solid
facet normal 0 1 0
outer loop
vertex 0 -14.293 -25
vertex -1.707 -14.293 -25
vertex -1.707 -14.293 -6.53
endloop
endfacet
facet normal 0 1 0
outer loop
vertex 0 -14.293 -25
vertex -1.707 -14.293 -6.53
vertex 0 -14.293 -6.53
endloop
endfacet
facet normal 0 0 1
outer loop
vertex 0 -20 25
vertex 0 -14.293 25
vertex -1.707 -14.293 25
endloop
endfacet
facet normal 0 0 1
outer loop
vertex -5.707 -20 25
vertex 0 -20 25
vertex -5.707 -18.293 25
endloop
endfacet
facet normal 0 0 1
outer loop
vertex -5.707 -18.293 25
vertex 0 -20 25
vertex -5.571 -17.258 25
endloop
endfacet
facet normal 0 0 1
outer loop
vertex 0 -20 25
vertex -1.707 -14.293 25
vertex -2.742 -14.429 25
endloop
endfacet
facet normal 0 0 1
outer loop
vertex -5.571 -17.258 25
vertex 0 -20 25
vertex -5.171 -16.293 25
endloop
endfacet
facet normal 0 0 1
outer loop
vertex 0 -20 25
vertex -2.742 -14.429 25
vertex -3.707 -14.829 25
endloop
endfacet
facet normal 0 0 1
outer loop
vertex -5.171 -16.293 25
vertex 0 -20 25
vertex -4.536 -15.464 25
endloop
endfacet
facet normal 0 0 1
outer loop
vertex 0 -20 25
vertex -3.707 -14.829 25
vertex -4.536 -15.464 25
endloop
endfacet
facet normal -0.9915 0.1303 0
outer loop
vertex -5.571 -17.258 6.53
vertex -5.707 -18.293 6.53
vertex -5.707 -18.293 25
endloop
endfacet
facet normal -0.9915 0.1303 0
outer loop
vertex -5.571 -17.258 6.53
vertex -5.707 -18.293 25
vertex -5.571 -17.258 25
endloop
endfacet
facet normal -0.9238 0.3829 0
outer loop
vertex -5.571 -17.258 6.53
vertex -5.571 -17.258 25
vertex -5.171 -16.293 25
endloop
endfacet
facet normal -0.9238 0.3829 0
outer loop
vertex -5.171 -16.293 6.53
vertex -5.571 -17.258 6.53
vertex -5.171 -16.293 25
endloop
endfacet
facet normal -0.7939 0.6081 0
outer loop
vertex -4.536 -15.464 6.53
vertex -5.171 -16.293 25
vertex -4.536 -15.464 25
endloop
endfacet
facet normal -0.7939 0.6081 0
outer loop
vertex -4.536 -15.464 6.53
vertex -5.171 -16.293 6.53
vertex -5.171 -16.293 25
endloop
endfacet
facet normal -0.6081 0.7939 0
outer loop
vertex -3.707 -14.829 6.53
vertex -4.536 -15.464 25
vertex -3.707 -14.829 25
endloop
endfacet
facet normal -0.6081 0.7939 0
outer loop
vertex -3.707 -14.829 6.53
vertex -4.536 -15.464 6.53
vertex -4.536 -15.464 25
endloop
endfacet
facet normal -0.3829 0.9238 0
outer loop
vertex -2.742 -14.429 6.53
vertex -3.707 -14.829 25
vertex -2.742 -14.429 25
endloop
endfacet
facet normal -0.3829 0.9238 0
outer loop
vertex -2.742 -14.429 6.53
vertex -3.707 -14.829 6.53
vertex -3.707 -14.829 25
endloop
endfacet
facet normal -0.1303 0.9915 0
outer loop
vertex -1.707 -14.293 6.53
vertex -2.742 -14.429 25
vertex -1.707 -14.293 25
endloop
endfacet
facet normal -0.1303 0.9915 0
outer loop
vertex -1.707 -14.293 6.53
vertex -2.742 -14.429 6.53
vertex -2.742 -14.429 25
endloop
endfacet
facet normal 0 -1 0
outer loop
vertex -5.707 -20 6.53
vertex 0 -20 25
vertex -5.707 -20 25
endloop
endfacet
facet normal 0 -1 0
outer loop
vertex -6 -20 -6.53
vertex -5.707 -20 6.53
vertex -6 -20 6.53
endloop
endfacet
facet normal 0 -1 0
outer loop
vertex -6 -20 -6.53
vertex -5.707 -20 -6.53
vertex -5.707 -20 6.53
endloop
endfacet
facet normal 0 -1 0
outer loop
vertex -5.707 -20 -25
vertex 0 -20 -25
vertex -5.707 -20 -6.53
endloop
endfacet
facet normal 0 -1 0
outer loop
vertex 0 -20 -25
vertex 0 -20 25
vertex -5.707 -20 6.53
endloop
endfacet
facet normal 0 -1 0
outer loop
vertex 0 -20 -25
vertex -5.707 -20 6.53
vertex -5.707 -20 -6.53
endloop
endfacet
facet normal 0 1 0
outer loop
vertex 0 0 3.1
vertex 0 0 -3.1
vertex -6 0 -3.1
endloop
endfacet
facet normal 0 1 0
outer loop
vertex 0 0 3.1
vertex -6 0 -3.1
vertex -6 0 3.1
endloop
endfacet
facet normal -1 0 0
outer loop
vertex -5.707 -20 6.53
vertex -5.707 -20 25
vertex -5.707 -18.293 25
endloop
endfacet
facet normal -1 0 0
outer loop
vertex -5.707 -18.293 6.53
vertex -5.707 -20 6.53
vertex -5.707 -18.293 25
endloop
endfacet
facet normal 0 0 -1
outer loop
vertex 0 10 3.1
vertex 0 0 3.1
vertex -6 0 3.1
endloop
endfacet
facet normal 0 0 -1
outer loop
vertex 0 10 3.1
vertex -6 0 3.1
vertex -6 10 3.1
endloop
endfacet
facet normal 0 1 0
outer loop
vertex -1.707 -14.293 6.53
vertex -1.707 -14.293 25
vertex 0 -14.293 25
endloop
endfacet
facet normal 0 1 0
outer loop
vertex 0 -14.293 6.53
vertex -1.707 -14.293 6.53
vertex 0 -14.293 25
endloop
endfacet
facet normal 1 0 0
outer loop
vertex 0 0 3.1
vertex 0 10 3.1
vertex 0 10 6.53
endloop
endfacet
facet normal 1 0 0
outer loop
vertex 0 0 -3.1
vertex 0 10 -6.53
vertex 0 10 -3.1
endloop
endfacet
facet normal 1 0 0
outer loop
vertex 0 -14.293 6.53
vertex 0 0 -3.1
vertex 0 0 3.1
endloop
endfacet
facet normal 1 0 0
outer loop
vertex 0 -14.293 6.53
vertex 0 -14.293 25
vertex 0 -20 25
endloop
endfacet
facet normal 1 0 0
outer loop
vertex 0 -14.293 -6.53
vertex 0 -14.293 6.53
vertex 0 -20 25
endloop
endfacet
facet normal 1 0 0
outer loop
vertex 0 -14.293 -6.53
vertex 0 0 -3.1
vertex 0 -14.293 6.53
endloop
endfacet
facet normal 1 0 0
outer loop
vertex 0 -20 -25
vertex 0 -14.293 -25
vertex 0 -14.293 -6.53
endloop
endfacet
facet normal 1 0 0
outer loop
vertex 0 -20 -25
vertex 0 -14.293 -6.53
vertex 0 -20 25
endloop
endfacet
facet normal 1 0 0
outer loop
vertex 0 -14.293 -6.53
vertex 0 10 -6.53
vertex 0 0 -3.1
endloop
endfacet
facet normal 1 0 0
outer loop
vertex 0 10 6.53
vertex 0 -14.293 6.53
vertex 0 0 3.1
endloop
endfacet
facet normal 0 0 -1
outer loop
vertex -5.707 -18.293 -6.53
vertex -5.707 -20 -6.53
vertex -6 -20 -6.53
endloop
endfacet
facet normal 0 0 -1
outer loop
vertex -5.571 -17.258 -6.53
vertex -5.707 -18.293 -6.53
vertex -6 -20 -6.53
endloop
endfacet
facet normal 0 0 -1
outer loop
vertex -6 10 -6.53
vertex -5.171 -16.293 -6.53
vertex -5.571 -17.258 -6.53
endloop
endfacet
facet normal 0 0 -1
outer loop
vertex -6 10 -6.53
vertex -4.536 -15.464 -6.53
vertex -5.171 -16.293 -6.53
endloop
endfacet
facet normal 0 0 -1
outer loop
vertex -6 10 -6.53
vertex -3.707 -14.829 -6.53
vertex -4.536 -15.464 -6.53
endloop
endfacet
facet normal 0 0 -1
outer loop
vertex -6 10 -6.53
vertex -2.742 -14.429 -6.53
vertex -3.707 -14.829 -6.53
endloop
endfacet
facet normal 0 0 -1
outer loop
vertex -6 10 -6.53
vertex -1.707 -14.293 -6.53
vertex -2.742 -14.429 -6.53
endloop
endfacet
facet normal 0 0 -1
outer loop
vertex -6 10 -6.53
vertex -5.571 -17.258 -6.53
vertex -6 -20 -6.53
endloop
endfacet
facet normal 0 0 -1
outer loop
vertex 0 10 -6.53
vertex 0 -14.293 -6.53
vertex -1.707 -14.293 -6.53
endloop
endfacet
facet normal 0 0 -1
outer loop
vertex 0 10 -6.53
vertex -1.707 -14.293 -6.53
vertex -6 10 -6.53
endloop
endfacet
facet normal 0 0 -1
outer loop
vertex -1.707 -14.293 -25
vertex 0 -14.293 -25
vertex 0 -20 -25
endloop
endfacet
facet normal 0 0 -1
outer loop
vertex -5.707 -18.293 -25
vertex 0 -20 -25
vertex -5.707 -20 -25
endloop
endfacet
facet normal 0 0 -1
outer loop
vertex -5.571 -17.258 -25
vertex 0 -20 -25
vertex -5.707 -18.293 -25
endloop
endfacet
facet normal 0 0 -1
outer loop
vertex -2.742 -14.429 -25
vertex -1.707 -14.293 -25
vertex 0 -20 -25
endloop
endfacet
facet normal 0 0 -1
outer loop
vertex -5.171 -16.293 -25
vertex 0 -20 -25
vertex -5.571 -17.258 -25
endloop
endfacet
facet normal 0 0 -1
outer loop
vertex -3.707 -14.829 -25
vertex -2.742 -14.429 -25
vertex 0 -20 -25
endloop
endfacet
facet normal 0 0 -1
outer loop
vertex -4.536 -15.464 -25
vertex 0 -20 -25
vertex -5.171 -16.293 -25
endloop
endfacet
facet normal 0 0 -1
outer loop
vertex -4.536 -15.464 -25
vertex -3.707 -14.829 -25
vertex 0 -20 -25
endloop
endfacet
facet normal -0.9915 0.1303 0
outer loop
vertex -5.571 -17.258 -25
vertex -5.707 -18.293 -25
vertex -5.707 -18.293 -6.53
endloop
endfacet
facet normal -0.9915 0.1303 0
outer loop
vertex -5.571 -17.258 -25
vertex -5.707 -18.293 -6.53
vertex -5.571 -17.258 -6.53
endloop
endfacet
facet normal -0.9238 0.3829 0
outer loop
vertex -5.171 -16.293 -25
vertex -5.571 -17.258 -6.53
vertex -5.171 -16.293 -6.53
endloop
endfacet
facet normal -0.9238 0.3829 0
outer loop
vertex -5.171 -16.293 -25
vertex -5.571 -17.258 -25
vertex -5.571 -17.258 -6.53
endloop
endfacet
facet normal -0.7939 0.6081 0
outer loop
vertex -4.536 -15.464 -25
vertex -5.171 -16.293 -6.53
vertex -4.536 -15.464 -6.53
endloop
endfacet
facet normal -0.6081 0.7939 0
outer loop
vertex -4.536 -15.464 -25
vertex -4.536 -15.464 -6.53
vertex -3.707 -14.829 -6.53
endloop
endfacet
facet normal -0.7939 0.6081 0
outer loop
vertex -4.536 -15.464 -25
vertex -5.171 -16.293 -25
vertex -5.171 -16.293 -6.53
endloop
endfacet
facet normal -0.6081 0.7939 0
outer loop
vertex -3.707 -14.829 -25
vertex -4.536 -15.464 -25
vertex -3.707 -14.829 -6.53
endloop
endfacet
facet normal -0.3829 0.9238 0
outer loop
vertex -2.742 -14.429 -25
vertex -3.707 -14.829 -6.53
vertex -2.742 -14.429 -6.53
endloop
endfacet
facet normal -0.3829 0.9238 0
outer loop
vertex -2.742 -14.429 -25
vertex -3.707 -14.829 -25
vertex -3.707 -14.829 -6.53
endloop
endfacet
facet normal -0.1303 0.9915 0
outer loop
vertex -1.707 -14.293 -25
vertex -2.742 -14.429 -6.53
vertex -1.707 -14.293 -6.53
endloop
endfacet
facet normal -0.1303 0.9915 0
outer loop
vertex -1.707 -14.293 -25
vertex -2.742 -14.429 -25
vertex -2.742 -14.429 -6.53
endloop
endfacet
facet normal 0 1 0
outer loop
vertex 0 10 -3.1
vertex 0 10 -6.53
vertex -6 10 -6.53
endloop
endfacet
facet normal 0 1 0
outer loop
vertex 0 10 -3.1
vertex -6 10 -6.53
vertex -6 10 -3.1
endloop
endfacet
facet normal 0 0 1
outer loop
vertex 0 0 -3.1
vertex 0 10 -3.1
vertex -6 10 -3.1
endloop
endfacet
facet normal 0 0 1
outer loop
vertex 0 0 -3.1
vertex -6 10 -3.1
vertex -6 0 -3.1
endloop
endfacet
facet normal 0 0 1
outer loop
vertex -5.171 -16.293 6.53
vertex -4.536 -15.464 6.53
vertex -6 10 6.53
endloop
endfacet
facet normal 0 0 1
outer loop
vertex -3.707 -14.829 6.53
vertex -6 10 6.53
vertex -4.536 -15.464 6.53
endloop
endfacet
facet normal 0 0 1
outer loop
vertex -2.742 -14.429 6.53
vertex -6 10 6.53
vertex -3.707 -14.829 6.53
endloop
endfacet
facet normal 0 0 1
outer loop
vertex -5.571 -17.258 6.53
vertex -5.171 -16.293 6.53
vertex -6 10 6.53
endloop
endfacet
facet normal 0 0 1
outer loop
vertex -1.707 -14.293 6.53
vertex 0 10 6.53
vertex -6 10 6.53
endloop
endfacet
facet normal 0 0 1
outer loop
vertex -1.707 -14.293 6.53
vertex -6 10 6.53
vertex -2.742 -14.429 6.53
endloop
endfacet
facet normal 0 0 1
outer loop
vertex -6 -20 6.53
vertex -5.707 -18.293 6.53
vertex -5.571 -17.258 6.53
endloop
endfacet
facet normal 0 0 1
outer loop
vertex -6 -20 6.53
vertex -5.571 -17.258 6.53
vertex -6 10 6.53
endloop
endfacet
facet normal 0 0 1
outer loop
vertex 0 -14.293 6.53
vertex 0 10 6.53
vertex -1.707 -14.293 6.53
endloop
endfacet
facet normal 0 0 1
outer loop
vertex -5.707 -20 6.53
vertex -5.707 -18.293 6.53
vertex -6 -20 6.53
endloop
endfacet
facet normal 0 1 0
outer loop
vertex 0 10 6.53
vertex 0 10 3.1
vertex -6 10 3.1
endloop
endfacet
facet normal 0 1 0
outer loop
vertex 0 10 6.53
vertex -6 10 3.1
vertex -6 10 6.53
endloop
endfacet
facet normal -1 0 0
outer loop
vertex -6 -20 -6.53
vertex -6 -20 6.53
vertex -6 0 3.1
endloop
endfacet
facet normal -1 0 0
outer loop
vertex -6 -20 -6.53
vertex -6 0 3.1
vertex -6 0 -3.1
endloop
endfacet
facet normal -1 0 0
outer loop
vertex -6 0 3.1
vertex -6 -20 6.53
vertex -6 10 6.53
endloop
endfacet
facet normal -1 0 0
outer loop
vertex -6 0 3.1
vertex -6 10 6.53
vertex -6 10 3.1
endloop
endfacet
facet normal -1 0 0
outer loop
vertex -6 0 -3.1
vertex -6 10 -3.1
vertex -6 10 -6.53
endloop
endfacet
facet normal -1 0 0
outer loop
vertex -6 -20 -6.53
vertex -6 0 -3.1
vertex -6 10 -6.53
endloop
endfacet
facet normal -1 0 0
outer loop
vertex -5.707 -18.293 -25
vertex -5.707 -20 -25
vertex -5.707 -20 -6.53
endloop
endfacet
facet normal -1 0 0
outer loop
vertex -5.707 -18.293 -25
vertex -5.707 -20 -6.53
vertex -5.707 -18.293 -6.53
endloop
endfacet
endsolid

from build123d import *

# Parameters (mm, degrees)
BOSS_EXTRUDE2_DEPTH      = 6
BOSS_EXTRUDE3_DEPTH      = 18.469887
BOSS_EXTRUDE3_DEPTH_BACK = 31.530113


with BuildPart() as part:
    # Sketch1 → Boss-Extrude2 (new body)
    with BuildSketch(Plane(origin=(0, 0, 0), x_dir=(0, 0, -1), z_dir=(1, 0, 0))):
        Polygon((-3.1, 0), (-3.1, 10), (-6.530112864, 10), (-6.530112864, -20), (6.530112864, -20), (6.530112864, 10), (3.1, 10), (3.1, 0), align=None)
    extrude(amount=-BOSS_EXTRUDE2_DEPTH)

    # Sketch2 → Boss-Extrude3 (add, two sides: drawn at the far end of the back side and taken through both)
    with BuildSketch(Plane.XY.offset(6.530112864).offset(-BOSS_EXTRUDE3_DEPTH_BACK)):
        with BuildLine():
            Line((0, -20), (-5.707191464, -20))
            Line((-5.707191464, -20), (-5.707191464, -18.292808536))
            ThreePointArc((-5.707191464, -18.292808536), (-4.535618589, -15.464381411), (-1.707191464, -14.292808536))
            Line((-1.707191464, -14.292808536), (0, -14.292808536))
            Line((0, -14.292808536), (0, -20))
        make_face()
    extrude(amount=BOSS_EXTRUDE3_DEPTH + BOSS_EXTRUDE3_DEPTH_BACK)


solid = part.part
